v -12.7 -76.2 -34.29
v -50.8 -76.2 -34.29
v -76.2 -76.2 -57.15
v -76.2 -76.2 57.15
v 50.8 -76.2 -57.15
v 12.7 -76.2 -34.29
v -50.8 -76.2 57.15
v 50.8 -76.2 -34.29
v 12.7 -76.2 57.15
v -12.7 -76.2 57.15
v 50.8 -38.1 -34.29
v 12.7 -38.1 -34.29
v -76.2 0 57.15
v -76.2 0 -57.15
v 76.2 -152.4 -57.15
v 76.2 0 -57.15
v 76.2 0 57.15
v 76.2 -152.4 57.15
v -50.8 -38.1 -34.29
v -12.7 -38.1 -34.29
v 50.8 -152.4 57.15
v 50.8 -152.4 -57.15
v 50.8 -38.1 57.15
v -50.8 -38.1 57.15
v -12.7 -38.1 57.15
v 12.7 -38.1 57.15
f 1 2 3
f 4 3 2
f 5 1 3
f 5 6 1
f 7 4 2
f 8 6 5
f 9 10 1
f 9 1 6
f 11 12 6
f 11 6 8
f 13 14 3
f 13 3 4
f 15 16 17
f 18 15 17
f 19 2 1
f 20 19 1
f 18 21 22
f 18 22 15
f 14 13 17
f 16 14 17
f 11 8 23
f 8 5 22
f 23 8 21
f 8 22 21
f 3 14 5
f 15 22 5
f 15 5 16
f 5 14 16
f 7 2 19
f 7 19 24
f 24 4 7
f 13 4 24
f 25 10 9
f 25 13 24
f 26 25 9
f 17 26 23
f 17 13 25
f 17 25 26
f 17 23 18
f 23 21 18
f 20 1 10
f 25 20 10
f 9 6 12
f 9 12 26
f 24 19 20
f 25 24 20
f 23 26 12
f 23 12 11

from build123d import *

# Parameters (mm, degrees)
F0_W     = 152.4
F0_H     = 114.3
F1_DEPTH = 152.4
F2_W     = 127
F2_H     = 114.3
F3_DEPTH = 76.2
F4_W     = 38.1
F4_H     = 91.44
F5_DEPTH = 38.1
F6_DEPTH = 38.1


with BuildPart() as f1:
    # F0 (on Front) → F1 (new body)
    with BuildSketch(Plane.XZ):
        Rectangle(F0_W, F0_H)
    extrude(amount=F1_DEPTH)

    # F2 (on face) → F3 (cut)
    with BuildSketch(Plane.XZ.offset(152.4)):
        with Locations((-12.7, 0)):
            Rectangle(F2_W, F2_H)
    extrude(amount=-F3_DEPTH, mode=Mode.SUBTRACT)

    # F4 (on face) → F5 (cut)
    with BuildSketch(Plane.XZ.offset(76.2)):
        with Locations((-31.75, 11.43)):
            Rectangle(F4_W, F4_H)
    extrude(amount=-F5_DEPTH, mode=Mode.SUBTRACT)

    # F4 (on face) → F6 (cut)
    with BuildSketch(Plane.XZ.offset(76.2)):
        with Locations((31.75, 11.43)):
            Rectangle(F4_W, F4_H)
    extrude(amount=-F6_DEPTH, mode=Mode.SUBTRACT)


solid = f1.part
